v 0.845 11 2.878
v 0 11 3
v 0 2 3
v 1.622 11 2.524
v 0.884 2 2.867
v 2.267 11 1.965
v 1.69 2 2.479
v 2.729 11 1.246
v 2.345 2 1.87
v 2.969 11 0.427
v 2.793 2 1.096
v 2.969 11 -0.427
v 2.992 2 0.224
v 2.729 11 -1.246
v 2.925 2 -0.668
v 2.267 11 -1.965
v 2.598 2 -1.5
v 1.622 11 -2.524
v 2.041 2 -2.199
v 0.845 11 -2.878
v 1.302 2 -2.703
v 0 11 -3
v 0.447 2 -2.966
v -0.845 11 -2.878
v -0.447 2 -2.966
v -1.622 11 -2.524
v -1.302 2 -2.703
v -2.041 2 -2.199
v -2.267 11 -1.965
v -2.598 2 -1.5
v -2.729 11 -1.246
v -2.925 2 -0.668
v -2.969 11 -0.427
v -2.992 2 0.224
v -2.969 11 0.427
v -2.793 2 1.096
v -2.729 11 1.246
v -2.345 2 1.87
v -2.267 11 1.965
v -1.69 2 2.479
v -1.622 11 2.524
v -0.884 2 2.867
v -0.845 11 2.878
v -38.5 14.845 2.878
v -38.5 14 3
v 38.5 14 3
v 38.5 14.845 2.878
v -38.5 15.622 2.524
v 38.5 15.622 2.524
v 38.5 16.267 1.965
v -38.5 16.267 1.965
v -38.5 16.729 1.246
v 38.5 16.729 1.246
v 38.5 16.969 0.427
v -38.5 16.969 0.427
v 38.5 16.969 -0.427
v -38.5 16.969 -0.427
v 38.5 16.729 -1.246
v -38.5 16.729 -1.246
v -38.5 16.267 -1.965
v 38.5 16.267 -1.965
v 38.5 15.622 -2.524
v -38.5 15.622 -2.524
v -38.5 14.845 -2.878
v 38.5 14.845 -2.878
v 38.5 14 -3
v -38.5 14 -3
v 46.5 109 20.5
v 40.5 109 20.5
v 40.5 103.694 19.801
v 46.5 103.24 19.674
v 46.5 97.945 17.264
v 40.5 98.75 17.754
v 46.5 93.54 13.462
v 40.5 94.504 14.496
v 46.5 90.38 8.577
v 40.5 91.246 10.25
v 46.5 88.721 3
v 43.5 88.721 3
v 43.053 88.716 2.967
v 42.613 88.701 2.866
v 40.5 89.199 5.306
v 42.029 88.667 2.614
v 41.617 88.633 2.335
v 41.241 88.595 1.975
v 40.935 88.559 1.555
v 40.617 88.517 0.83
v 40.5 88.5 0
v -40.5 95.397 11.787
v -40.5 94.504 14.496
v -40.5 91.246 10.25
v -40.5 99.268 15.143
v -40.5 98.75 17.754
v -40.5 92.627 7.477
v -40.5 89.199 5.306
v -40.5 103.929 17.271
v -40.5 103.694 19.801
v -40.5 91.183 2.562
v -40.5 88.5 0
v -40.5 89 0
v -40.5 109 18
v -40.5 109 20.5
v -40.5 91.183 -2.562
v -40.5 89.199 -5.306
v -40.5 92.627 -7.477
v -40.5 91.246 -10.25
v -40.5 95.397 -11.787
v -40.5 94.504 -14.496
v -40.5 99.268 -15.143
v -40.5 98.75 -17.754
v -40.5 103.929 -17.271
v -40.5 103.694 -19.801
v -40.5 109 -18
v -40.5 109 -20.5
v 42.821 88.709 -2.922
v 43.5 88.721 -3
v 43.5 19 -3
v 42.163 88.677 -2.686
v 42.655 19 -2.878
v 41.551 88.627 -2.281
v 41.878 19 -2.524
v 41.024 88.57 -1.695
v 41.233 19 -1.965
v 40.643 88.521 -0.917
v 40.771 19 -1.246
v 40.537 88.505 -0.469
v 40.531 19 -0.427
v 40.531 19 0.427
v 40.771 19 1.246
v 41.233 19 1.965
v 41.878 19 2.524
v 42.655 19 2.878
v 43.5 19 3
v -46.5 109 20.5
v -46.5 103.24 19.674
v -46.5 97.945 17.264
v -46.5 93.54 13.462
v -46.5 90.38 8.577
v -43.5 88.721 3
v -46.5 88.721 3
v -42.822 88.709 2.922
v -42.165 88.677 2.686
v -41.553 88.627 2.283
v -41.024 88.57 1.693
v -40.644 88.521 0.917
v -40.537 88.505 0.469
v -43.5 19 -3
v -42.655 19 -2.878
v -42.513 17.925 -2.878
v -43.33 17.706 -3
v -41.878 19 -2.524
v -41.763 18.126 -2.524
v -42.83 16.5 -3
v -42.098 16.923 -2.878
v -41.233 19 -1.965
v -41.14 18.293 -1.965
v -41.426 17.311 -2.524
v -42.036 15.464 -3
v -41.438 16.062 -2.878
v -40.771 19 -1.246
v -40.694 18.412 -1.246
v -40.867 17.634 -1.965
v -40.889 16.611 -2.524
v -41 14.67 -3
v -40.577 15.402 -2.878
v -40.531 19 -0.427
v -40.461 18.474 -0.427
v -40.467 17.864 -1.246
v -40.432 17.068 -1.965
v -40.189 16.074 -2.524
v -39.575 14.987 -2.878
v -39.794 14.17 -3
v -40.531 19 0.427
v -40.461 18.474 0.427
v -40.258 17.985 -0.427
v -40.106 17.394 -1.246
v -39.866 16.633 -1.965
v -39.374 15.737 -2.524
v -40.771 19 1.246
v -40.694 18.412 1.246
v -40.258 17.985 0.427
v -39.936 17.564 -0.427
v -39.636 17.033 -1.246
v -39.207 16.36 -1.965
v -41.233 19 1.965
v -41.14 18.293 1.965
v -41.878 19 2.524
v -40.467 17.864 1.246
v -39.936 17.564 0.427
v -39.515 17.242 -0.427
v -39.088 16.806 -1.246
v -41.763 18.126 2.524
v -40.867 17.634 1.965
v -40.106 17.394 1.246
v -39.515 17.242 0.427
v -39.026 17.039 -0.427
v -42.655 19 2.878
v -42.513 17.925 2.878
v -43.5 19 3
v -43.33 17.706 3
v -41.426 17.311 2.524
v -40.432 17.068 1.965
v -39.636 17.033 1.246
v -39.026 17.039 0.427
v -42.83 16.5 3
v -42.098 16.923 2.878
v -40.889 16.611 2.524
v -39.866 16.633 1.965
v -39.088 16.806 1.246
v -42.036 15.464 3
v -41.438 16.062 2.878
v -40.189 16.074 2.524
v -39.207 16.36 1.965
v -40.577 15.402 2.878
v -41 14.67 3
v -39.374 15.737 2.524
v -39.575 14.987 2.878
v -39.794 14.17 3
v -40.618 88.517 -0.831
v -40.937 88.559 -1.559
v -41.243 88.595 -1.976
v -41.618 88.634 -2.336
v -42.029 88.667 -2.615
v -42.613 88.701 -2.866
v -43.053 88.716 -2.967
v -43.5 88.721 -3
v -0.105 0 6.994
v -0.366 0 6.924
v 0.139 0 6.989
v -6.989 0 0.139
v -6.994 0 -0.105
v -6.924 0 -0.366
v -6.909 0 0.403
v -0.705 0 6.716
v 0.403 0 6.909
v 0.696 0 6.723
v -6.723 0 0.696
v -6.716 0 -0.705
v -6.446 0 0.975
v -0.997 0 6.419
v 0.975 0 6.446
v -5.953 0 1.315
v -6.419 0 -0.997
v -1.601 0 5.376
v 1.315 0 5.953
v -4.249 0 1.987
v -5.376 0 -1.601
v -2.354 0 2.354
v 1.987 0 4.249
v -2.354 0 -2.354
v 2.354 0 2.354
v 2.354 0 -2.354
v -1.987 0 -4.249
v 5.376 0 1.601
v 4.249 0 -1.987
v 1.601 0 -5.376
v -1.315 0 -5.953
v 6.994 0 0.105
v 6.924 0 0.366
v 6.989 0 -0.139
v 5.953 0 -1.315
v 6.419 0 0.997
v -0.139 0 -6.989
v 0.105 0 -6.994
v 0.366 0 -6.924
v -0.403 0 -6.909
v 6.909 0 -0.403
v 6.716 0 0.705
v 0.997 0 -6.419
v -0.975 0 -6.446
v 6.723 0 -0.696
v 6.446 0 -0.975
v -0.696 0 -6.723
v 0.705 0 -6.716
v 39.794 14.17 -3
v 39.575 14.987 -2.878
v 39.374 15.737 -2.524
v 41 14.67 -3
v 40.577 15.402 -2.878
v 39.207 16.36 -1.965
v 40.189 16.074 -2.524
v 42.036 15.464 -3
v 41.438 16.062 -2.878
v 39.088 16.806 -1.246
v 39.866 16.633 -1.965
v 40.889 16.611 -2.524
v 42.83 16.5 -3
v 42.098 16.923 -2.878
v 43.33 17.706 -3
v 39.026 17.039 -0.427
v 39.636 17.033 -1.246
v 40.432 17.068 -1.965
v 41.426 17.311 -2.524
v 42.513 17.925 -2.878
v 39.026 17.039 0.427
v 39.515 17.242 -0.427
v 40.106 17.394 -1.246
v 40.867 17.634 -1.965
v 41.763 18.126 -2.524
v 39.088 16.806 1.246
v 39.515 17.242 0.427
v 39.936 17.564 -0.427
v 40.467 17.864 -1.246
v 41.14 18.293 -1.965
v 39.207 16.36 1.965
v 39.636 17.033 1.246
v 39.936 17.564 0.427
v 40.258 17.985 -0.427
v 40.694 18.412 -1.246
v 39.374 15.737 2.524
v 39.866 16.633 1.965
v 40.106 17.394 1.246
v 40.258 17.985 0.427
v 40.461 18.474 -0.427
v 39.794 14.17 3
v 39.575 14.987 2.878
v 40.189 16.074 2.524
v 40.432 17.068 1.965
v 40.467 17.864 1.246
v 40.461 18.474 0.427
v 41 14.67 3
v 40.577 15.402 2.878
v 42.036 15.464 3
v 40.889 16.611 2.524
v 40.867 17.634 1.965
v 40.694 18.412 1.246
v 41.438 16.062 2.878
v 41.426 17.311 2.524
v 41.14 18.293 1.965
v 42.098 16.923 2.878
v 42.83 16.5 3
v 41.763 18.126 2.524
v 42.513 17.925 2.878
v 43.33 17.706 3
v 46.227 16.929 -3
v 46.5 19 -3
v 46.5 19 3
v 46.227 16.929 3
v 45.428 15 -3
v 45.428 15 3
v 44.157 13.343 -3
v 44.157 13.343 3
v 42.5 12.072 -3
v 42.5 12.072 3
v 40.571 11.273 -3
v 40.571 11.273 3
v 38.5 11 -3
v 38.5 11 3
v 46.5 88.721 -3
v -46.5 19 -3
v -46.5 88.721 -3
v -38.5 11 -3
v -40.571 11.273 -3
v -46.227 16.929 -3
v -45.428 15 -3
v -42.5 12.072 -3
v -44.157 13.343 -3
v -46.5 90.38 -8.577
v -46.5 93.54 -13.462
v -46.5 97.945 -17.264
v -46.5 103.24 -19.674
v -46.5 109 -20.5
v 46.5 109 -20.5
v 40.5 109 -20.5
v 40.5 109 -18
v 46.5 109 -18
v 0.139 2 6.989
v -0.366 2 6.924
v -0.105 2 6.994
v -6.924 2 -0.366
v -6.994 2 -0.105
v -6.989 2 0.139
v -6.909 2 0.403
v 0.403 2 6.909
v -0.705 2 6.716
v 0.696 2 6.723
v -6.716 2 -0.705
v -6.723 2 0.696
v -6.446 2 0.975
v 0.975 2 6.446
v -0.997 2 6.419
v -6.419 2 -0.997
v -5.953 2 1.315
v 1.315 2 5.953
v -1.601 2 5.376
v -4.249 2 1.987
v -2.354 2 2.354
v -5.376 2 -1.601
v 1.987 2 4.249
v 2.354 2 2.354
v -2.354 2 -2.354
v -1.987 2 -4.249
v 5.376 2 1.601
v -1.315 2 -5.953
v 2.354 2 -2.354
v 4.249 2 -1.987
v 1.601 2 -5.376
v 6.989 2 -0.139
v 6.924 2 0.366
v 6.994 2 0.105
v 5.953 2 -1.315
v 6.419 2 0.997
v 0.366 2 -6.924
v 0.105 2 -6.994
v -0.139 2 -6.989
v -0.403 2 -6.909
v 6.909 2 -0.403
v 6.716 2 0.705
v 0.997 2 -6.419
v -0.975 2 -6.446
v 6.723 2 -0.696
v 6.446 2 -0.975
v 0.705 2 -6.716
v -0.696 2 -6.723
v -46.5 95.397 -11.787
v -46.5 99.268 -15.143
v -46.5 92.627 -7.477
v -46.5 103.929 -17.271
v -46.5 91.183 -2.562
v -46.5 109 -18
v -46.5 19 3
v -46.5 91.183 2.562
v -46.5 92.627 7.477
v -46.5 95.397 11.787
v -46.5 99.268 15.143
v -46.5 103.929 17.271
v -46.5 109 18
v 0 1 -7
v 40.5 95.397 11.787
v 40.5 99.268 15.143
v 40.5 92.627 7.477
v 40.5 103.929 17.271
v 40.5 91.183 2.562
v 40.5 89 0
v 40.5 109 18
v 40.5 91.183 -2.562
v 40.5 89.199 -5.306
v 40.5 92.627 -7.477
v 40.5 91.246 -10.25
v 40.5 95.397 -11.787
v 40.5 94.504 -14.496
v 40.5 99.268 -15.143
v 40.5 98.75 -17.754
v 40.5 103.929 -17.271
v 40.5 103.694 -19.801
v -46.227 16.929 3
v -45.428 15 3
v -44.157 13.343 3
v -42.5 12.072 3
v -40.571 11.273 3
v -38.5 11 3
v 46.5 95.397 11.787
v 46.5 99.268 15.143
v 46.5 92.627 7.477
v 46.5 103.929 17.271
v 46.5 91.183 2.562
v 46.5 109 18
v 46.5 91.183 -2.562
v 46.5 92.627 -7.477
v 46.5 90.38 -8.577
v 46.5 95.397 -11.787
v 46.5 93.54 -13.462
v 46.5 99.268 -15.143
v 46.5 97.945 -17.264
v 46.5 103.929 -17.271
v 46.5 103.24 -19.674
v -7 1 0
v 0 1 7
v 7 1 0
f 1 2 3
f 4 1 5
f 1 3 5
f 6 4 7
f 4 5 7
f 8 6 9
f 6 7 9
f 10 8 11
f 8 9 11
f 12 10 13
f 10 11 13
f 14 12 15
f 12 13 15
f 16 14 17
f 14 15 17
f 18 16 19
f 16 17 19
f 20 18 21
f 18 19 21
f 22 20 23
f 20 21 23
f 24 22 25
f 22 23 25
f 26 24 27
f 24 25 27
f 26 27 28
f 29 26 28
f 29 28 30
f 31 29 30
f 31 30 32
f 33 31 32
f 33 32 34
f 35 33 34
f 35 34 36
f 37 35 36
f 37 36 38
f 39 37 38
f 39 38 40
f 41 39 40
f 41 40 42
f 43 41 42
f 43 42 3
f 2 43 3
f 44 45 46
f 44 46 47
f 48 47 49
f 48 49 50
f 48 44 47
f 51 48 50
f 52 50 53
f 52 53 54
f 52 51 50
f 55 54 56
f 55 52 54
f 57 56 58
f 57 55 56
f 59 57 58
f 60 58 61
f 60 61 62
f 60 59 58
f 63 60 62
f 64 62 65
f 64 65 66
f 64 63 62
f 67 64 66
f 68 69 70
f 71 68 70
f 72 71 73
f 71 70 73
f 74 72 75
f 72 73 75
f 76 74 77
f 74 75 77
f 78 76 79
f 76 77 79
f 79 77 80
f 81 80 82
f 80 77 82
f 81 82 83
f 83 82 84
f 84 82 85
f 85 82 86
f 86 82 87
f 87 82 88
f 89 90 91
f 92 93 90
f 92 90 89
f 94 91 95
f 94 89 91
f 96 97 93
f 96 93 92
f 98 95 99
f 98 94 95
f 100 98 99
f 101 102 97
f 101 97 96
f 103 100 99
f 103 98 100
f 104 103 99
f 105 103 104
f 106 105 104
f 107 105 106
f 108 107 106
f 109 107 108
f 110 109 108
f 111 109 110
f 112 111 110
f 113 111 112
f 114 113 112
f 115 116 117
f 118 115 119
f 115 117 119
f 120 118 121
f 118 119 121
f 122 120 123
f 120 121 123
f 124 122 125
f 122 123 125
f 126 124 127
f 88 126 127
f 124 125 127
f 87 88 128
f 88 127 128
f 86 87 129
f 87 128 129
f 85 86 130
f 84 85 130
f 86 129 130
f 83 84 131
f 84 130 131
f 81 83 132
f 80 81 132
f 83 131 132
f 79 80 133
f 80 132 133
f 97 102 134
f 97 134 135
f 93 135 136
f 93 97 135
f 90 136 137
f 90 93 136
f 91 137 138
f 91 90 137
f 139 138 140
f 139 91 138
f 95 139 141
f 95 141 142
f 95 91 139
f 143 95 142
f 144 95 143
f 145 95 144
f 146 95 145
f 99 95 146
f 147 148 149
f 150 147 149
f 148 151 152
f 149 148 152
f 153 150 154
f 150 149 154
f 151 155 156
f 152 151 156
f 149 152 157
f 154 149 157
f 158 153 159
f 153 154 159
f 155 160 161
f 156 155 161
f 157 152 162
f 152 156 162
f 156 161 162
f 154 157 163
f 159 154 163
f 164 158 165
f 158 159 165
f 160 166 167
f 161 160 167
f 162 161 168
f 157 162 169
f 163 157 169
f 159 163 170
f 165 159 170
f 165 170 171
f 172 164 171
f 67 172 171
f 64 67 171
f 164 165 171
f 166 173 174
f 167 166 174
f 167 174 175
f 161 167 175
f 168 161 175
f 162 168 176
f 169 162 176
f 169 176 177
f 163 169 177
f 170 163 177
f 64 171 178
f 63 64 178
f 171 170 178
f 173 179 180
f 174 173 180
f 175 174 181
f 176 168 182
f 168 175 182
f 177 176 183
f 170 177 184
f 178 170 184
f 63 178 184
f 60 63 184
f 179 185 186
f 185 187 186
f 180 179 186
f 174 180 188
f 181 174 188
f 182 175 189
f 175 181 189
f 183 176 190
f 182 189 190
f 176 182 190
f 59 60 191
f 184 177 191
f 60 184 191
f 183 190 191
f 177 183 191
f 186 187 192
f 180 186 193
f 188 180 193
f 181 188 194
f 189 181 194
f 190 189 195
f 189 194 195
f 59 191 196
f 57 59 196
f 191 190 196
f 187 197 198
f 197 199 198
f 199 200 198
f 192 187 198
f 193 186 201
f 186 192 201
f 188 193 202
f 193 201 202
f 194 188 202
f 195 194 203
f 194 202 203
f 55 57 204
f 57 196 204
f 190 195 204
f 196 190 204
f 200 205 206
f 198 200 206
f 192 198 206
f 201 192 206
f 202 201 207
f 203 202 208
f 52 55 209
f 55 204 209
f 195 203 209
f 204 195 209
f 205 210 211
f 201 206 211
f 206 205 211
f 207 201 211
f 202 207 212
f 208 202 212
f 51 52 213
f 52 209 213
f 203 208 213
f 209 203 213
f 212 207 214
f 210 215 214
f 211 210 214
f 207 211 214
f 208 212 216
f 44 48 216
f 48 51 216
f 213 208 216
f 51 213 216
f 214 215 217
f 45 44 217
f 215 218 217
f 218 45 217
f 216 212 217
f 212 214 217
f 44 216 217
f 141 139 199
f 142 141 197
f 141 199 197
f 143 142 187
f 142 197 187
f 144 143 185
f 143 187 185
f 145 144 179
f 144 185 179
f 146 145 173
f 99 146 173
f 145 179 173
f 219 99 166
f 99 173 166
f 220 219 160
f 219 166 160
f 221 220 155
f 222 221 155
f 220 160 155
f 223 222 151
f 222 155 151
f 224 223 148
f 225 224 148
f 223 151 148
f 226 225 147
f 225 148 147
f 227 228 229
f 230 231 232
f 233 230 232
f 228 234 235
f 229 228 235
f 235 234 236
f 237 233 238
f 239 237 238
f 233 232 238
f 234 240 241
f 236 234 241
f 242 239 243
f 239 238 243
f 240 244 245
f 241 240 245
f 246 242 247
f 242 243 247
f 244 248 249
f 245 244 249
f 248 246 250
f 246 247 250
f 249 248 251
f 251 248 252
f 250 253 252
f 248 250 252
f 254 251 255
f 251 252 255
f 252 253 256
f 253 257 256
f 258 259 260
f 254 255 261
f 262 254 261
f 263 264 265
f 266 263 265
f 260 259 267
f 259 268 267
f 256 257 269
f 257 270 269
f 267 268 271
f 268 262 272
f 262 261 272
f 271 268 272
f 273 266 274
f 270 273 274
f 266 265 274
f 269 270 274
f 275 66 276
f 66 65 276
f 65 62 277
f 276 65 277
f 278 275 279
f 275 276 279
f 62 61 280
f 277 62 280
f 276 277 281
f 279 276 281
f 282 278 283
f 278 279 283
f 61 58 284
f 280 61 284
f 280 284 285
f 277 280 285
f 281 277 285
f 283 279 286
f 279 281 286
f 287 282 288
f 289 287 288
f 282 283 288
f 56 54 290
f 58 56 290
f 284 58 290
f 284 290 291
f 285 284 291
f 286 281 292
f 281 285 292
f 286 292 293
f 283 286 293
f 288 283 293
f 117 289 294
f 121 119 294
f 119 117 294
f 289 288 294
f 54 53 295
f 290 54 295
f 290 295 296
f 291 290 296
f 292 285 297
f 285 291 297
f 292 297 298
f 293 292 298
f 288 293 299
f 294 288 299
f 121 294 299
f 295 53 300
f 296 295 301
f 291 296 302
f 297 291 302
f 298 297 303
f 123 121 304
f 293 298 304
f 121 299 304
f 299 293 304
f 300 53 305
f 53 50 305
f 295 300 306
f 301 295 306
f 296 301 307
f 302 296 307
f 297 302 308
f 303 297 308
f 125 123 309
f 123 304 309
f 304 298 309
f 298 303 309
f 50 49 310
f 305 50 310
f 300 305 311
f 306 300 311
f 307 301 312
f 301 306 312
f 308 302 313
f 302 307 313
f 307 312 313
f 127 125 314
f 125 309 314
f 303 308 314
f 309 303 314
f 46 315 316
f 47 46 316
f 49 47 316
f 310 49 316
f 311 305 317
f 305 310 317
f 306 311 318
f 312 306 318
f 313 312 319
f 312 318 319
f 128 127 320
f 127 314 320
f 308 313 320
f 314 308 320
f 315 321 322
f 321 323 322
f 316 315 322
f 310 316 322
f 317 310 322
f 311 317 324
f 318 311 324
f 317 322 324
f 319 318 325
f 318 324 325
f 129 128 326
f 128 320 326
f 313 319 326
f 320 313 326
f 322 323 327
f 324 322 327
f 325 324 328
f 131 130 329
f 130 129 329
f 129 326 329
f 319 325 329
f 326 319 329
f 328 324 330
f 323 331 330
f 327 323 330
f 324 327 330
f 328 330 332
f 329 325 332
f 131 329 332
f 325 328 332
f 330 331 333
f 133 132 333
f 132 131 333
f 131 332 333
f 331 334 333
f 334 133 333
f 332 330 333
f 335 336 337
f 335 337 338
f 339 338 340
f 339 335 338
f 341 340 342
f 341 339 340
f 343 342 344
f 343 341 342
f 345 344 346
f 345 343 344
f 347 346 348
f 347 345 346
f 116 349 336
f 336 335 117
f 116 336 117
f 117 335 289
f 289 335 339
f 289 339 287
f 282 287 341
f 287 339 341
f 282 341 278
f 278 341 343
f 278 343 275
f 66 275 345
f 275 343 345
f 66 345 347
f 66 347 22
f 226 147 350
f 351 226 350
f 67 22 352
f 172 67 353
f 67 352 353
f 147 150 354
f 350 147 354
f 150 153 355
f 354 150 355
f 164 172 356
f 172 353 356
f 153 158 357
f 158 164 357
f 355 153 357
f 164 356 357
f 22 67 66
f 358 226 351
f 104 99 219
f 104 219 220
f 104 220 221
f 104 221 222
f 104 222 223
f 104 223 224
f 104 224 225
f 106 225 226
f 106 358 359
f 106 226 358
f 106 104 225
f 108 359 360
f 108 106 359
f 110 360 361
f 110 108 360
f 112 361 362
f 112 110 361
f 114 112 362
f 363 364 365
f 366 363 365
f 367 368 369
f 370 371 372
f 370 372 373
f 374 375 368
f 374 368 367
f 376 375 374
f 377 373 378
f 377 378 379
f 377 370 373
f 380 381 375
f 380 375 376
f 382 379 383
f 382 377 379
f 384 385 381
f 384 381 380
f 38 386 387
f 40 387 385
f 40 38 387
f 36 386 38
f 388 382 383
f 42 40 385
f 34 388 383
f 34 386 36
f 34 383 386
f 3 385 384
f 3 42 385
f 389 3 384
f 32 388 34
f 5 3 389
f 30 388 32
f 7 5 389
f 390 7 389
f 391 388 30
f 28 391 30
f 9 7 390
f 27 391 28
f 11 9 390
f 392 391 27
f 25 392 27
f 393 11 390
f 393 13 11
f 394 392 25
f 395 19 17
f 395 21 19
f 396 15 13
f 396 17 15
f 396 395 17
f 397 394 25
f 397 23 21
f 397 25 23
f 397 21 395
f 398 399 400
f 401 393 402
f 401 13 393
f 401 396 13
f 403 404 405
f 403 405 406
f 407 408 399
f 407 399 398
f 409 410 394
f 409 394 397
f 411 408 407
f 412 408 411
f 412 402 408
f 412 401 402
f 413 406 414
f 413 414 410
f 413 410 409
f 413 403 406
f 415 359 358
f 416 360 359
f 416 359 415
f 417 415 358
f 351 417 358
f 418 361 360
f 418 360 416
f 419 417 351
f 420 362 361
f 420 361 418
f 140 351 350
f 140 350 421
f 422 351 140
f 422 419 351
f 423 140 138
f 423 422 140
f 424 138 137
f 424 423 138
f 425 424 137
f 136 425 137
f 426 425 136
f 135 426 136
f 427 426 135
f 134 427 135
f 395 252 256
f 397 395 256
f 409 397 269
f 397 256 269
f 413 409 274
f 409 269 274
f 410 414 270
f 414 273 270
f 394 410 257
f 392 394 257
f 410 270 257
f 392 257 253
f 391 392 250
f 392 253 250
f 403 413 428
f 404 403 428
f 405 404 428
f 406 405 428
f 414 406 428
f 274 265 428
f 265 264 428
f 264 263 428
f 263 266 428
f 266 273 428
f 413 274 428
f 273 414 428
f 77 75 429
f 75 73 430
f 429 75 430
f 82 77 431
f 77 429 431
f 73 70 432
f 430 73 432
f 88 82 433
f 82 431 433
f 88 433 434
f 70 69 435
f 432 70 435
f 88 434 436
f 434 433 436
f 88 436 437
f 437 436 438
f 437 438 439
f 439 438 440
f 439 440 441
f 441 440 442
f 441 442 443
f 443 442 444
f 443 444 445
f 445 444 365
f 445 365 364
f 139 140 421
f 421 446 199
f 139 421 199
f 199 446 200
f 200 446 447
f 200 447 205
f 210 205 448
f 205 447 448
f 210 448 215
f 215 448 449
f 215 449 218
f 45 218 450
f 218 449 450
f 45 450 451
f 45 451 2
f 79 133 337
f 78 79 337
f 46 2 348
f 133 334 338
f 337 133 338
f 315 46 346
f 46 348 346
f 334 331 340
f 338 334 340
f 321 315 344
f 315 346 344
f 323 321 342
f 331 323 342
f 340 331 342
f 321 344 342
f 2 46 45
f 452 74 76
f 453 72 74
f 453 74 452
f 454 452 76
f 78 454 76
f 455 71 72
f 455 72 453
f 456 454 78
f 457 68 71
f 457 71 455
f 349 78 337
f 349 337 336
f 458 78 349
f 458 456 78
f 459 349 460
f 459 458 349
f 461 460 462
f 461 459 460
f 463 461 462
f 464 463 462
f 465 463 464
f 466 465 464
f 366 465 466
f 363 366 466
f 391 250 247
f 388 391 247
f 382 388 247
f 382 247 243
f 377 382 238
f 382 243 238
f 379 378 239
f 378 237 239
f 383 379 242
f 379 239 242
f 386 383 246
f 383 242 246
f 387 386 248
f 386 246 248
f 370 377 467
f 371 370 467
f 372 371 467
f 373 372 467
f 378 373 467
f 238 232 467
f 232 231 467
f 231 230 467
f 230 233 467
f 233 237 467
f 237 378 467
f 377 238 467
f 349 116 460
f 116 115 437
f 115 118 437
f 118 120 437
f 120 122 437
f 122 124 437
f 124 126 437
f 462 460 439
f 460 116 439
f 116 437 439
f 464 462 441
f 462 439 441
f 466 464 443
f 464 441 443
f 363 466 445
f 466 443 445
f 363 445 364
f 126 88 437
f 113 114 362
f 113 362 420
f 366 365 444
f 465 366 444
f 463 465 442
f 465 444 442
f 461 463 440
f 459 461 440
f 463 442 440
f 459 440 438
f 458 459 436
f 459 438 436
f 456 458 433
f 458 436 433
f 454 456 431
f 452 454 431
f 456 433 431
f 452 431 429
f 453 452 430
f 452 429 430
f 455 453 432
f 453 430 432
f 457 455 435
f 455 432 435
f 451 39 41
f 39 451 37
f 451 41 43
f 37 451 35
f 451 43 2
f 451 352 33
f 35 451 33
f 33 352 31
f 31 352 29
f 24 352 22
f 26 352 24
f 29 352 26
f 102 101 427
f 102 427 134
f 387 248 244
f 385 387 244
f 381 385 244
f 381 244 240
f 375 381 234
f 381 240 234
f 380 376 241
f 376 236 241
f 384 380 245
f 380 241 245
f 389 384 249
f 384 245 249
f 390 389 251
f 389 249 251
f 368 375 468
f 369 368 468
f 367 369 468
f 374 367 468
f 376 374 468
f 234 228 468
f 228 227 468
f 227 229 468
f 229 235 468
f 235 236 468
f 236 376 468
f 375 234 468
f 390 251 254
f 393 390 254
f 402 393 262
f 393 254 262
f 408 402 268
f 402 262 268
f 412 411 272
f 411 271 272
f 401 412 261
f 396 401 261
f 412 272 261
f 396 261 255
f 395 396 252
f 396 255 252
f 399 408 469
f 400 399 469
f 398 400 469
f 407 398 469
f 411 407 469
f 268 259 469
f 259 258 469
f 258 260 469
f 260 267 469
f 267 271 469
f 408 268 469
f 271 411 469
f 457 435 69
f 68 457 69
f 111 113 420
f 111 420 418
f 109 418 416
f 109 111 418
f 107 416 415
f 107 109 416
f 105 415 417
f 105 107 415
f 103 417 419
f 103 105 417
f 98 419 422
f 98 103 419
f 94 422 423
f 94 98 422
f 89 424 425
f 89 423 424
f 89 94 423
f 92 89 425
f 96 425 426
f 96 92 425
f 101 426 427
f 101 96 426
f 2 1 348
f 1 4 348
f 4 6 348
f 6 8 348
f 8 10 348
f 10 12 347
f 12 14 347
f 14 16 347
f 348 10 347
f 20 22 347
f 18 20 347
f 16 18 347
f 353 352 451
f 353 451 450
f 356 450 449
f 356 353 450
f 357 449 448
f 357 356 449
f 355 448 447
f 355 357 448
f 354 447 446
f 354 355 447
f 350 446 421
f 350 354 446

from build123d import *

# Parameters (mm, degrees)
BOSS_EXTRUDE3_DEPTH             = 2
SKETCH3_R                       = 3
BOSS_EXTRUDE4_DEPTH             = 9
BOSS_EXTRUDE5_DEPTH             = 38.5
BOSS_EXTRUDE5_DEPTH_BACK        = 38.5
SWEEP2_START                    = 11
SWEEP2_DEPTH                    = 78
SWEEP2_2_DEPTH                  = 8
SWEEP2_START_2                  = -4
SWEEP2_3_DEPTH                  = 8
SWEEP4_START                    = 11
SWEEP4_DEPTH                    = 78
SWEEP4_2_DEPTH                  = 8
SWEEP4_START_2                  = -4
SWEEP4_3_DEPTH                  = 8
BOSS_EXTRUDE6_DEPTH             = 3
BOSS_EXTRUDE6_DIRECTION_2_REACH = 128.768
BOSS_EXTRUDE7_DEPTH             = 3
BOSS_EXTRUDE7_DEPTH_BACK        = 3


with BuildPart() as part:
    # Sketch2 → Boss-Extrude3 (new body)
    with BuildSketch(Plane(origin=(0, 0, 0), x_dir=(1, 0, 0), z_dir=(0, 1, 0))):
        with BuildLine():
            add(Edge.make_bspline(
                [(-2.354354779, -2.354354779), (0, -20.812496246), (2.354354779, -2.354354779)],
                knots=[5.055412921, 5.055412921, 5.055412921, 7.510957694, 7.510957694, 7.510957694], degree=2, weights=[1, 0.336336397, 1]))
            add(Edge.make_bspline(
                [(2.354354779, -2.354354779), (20.812496246, 0), (2.354354779, 2.354354779)],
                knots=[1.913820267, 1.913820267, 1.913820267, 4.36936504, 4.36936504, 4.36936504], degree=2, weights=[1, 0.336336397, 1]))
            add(Edge.make_bspline(
                [(2.354354779, 2.354354779), (0, 20.812496246), (-2.354354779, 2.354354779)],
                knots=[1.913820267, 1.913820267, 1.913820267, 4.36936504, 4.36936504, 4.36936504], degree=2, weights=[1, 0.336336397, 1]))
            add(Edge.make_bspline(
                [(-2.354354779, 2.354354779), (-20.812496246, 0), (-2.354354779, -2.354354779)],
                knots=[5.055412921, 5.055412921, 5.055412921, 7.510957694, 7.510957694, 7.510957694], degree=2, weights=[1, 0.336336397, 1]))
        make_face()
    extrude(amount=BOSS_EXTRUDE3_DEPTH)

    # Sketch3 → Boss-Extrude4 (add)
    with BuildSketch(Plane(origin=(0, 2, 0), x_dir=(1, 0, 0), z_dir=(0, 1, 0))):
        with Locations(Location((0, 0, 0), (0, 0, 270))):
            Circle(SKETCH3_R)
    extrude(amount=BOSS_EXTRUDE4_DEPTH)

    # Sketch4 → Boss-Extrude5 (add, two sides: drawn at the far end of the back side and taken through both)
    with BuildSketch(Plane(origin=(0, 0, 0), x_dir=(0, 0, -1), z_dir=(1, 0, 0)).offset(-BOSS_EXTRUDE5_DEPTH_BACK)):
        with BuildLine():
            Line((3, 11), (-3, 11))
            Line((-3, 11), (-3, 14))
            ThreePointArc((-3, 14), (0, 17), (3, 14))
            Line((3, 14), (3, 11))
        make_face()
    extrude(amount=BOSS_EXTRUDE5_DEPTH + BOSS_EXTRUDE5_DEPTH_BACK)



with BuildPart() as body_2:
    # Sweep2: read off the stored shape, not the designer's step
    # Sweep2 outline → Sweep2 (new body)
    with BuildSketch(Plane(origin=(0, 0, 0), x_dir=(1, 0, 0), z_dir=(0, 1, 0)).offset(SWEEP2_START)):
        with BuildLine():
            Line((46.5, -3), (46.5, 3))
            Line((46.5, 3), (43.5, 3))
            ThreePointArc((43.5, 3), (40.5, 0), (43.5, -3))
            Line((43.5, -3), (46.5, -3))
        make_face()
    extrude(amount=SWEEP2_DEPTH)


with BuildPart() as part_1:
    add(part.part)

    add(body_2.part)  # Sweep2 2 merges body 2
    # Sweep2 2 outline → Sweep2 2 (add)
    with BuildSketch(Plane(origin=(0, 0, 0), x_dir=(1, 0, 0), z_dir=(0, 1, 0)).offset(SWEEP2_START)):
        with BuildLine():
            ThreePointArc((43.5, -3), (40.5, 0), (43.5, 3))
            Line((43.5, 3), (38.5, 3))
            Line((38.5, 3), (38.5, -3))
            Line((38.5, -3), (43.5, -3))
        make_face()
    extrude(amount=SWEEP2_2_DEPTH)

    # Sweep2 3 outline → Sweep2 3 (cut)
    with BuildSketch(Plane.XY.offset(SWEEP2_START_2)):
        with BuildLine():
            ThreePointArc((46.5, 19), (44.156854249, 13.343145751), (38.5, 11))
            Line((38.5, 11), (46.5, 11))
            Line((46.5, 11), (46.5, 19))
        make_face()
    extrude(amount=SWEEP2_3_DEPTH, mode=Mode.SUBTRACT)

    # Sweep2 4 outline → Sweep2 4 (revolve, cut)
    with BuildSketch(Plane(origin=(38.5, 19, 0), x_dir=(1, 0, 0), z_dir=(0, -1, 0))):
        with BuildLine():
            ThreePointArc((5, -3), (2, 0), (5, 3))
            Line((5, 3), (0, 3))
            Line((0, 3), (0, -3))
            Line((0, -3), (5, -3))
        make_face()
    revolve(axis=Axis((38.5, 19, 0), (0, 0, 1)), mode=Mode.SUBTRACT)



with BuildPart() as body_2_2:
    # Sweep4: read off the stored shape, not the designer's step
    # Sweep4 outline → Sweep4 (new body)
    with BuildSketch(Plane(origin=(0, 0, 0), x_dir=(1, 0, 0), z_dir=(0, 1, 0)).offset(SWEEP4_START)):
        with BuildLine():
            ThreePointArc((-43.5, -3), (-40.5, 0), (-43.5, 3))
            Line((-43.5, 3), (-46.5, 3))
            Line((-46.5, 3), (-46.5, -3))
            Line((-46.5, -3), (-43.5, -3))
        make_face()
    extrude(amount=SWEEP4_DEPTH)


with BuildPart() as part_2:
    add(part_1.part)

    add(body_2_2.part)  # Sweep4 2 merges body 2 2
    # Sweep4 2 outline → Sweep4 2 (add)
    with BuildSketch(Plane(origin=(0, 0, 0), x_dir=(1, 0, 0), z_dir=(0, 1, 0)).offset(SWEEP4_START)):
        with BuildLine():
            Line((-38.5, -3), (-38.5, 3))
            Line((-38.5, 3), (-43.5, 3))
            ThreePointArc((-43.5, 3), (-40.5, 0), (-43.5, -3))
            Line((-43.5, -3), (-38.5, -3))
        make_face()
    extrude(amount=SWEEP4_2_DEPTH)

    # Sweep4 3 outline → Sweep4 3 (cut)
    with BuildSketch(Plane.XY.offset(SWEEP4_START_2)):
        with BuildLine():
            Line((-46.5, 11), (-38.5, 11))
            ThreePointArc((-38.5, 11), (-44.156854249, 13.343145751), (-46.5, 19))
            Line((-46.5, 19), (-46.5, 11))
        make_face()
    extrude(amount=SWEEP4_3_DEPTH, mode=Mode.SUBTRACT)

    # Sweep4 4 outline → Sweep4 4 (revolve, cut)
    with BuildSketch(Plane(origin=(-38.5, 19, 0), x_dir=(1, 0, 0), z_dir=(0, -1, 0))):
        with BuildLine():
            Line((0, -3), (5, -3))
            ThreePointArc((5, -3), (2, 0), (5, 3))
            Line((5, 3), (0, 3))
            Line((0, 3), (0, -3))
        make_face()
    revolve(axis=Axis((-38.5, 19, 0), (0, 0, 1)), mode=Mode.SUBTRACT)

    # Sketch8 → Boss-Extrude6 (add)
    with BuildSketch(Plane(origin=(-43.5, 0, 0), x_dir=(0, 0, -1), z_dir=(1, 0, 0))):
        with BuildLine():
            Line((20.5, 109), (18, 109))
            ThreePointArc((18, 109), (0, 91), (-18, 109))
            Line((-18, 109), (-20.5, 109))
            ThreePointArc((-20.5, 109), (0, 88.5), (20.5, 109))
        make_face()
    extrude(amount=BOSS_EXTRUDE6_DEPTH)

    # Boss-Extrude6 direction 2: up to this face of the body (flat: up to its plane)
    boss_extrude6_direction_2_end = Plane(part_2.part.faces().sort_by_distance((-46.5, 54, 0))[0])
    # Sketch8 → Boss-Extrude6 direction 2 (add, up to the picked face)
    with BuildSketch(Plane(origin=(-43.5, 0, 0), x_dir=(0, 0, -1), z_dir=(1, 0, 0)), mode=Mode.PRIVATE) as boss_extrude6_direction_2_sk1:
        with BuildLine():
            Line((20.5, 109), (18, 109))
            ThreePointArc((18, 109), (0, 91), (-18, 109))
            Line((-18, 109), (-20.5, 109))
            ThreePointArc((-20.5, 109), (0, 88.5), (20.5, 109))
        make_face()
    boss_extrude6_direction_2_tool1 = split(extrude(boss_extrude6_direction_2_sk1.sketch, amount=-BOSS_EXTRUDE6_DIRECTION_2_REACH, mode=Mode.PRIVATE), bisect_by=boss_extrude6_direction_2_end, keep=Keep.BOTH, mode=Mode.PRIVATE)
    add(boss_extrude6_direction_2_tool1.solids().sort_by(Axis((-43.5, 108.541606, -19.25), (-1, 0, 0)))[0])

    # Sketch9 → Boss-Extrude7 (add, two sides: drawn at the far end of the back side and taken through both)
    with BuildSketch(Plane(origin=(43.5, 0, 0), x_dir=(0, 0, -1), z_dir=(1, 0, 0)).offset(-BOSS_EXTRUDE7_DEPTH_BACK)):
        with BuildLine():
            Line((-18, 109), (-20.5, 109))
            ThreePointArc((-20.5, 109), (0, 88.5), (20.5, 109))
            Line((20.5, 109), (18, 109))
            ThreePointArc((18, 109), (0, 91), (-18, 109))
        make_face()
    extrude(amount=BOSS_EXTRUDE7_DEPTH + BOSS_EXTRUDE7_DEPTH_BACK)


solid = part_2.part
